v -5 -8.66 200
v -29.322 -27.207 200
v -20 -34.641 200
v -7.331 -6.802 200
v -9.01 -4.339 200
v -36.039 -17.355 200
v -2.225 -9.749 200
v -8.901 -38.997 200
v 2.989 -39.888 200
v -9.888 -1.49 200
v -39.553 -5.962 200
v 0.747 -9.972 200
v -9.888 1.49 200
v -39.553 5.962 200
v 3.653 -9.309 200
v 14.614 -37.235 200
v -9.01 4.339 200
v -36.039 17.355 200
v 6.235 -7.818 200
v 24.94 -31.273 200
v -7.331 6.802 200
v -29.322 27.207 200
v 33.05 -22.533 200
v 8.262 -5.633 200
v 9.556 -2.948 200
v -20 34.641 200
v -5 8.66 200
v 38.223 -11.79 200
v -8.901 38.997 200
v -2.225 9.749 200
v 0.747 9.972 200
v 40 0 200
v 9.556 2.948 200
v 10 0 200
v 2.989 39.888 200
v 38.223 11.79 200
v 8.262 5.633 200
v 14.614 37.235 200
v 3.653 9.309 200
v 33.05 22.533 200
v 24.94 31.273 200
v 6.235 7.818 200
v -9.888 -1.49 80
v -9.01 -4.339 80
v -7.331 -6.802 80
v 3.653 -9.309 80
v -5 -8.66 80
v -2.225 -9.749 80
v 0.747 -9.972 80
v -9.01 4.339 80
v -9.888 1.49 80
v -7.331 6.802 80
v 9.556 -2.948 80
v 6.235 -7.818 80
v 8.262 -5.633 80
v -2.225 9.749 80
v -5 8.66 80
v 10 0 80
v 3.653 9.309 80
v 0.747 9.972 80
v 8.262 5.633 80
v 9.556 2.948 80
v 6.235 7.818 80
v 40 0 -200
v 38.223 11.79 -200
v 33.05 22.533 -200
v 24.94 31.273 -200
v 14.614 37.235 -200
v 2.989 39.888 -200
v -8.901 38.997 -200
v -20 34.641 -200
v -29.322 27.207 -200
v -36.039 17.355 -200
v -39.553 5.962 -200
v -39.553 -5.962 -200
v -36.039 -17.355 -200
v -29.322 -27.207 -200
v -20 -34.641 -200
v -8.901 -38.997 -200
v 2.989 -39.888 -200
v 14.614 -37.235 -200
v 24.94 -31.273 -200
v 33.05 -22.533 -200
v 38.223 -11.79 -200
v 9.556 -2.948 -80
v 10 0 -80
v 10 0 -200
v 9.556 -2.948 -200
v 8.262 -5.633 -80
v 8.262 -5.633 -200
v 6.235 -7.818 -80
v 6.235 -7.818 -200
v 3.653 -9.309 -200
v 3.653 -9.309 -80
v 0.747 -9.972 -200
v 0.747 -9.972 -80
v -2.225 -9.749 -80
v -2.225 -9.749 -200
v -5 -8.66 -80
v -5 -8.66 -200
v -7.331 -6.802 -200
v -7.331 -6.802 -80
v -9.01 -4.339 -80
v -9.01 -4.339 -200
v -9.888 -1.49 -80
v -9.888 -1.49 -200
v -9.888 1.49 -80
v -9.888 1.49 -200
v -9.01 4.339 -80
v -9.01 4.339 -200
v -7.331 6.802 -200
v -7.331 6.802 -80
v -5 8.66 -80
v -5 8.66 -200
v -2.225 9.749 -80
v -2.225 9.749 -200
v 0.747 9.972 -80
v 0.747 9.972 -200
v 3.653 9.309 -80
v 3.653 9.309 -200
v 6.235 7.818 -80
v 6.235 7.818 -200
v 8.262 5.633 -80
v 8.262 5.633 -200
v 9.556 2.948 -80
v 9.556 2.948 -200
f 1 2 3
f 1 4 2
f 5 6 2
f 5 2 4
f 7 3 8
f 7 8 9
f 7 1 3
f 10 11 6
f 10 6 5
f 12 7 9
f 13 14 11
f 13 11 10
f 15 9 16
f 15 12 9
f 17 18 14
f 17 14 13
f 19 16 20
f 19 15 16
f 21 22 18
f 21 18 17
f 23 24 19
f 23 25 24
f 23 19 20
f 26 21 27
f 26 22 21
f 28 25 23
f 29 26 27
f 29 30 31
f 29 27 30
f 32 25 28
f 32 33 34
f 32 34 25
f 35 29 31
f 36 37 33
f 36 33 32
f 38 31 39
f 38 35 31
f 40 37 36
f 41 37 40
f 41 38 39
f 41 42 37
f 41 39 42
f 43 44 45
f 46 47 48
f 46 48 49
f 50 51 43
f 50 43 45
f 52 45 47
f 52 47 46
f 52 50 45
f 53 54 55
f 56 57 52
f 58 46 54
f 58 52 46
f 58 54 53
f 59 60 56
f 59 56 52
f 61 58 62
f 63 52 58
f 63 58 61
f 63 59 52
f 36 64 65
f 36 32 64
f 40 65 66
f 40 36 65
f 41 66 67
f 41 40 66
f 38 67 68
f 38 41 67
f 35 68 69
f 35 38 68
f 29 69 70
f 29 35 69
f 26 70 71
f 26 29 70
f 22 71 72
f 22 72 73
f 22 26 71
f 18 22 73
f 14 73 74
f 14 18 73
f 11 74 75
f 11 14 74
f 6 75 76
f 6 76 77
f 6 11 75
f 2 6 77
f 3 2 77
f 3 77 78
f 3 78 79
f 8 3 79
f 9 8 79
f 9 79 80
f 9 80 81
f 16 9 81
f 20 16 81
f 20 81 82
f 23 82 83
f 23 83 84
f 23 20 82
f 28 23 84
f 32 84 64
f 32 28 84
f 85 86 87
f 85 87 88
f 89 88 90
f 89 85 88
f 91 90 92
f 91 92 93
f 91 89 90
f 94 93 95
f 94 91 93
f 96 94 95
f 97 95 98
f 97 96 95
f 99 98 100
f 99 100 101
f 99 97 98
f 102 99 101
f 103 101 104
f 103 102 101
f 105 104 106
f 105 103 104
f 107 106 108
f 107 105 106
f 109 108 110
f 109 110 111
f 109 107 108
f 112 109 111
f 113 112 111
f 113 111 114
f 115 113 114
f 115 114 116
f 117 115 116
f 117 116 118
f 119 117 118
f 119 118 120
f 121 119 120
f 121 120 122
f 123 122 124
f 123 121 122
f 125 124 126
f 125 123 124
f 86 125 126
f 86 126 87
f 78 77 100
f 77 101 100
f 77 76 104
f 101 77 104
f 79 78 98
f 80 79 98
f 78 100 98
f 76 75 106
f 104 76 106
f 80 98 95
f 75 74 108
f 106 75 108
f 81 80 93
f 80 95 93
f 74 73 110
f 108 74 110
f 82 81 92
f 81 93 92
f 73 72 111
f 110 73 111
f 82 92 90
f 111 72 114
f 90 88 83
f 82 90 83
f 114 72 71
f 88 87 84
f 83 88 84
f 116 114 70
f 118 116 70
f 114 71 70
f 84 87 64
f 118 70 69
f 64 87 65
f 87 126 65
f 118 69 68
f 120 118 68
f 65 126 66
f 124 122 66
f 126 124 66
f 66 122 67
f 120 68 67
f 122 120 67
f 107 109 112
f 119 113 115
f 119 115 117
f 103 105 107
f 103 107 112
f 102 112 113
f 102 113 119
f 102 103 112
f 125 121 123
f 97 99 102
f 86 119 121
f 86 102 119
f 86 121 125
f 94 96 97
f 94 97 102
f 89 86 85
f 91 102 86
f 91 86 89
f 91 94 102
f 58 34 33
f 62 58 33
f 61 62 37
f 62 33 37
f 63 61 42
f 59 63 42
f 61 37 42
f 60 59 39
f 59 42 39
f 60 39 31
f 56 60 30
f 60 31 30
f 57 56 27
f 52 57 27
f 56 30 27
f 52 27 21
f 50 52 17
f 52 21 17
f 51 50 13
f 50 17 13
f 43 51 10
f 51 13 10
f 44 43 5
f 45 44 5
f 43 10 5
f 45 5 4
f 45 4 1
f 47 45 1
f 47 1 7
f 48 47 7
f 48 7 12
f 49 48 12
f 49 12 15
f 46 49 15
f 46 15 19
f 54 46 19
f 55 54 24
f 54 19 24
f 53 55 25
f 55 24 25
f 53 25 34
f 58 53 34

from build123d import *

# Parameters (mm, degrees)
SKETCH1_R           = 40
BOSS_EXTRUDE1_DEPTH = 200
SKETCH2_R           = 10
CUT_EXTRUDE1_DEPTH  = 120
CUT_EXTRUDE2_START  = -120
SKETCH3_R           = 10
CUT_EXTRUDE2_DEPTH  = 120


with BuildPart() as part:
    # Sketch1 → Boss-Extrude1 (new, symmetric)
    with BuildSketch(Plane.XY):
        Circle(SKETCH1_R)
    extrude(amount=BOSS_EXTRUDE1_DEPTH, both=True)

    # Sketch2 → Cut-Extrude1 (cut)
    with BuildSketch(Plane.XY.offset(200)):
        Circle(SKETCH2_R)
    extrude(amount=-CUT_EXTRUDE1_DEPTH, mode=Mode.SUBTRACT)

    # Sketch3 → Cut-Extrude2 (cut)
    with BuildSketch(Plane(origin=(0, 0, -200), x_dir=(-1, 0, 0), z_dir=(0, 0, -1)).offset(CUT_EXTRUDE2_START)):
        with Locations(Location((0, 0, 0), (0, 0, 180))):
            Circle(SKETCH3_R)
    extrude(amount=CUT_EXTRUDE2_DEPTH, mode=Mode.SUBTRACT)


solid = part.part
